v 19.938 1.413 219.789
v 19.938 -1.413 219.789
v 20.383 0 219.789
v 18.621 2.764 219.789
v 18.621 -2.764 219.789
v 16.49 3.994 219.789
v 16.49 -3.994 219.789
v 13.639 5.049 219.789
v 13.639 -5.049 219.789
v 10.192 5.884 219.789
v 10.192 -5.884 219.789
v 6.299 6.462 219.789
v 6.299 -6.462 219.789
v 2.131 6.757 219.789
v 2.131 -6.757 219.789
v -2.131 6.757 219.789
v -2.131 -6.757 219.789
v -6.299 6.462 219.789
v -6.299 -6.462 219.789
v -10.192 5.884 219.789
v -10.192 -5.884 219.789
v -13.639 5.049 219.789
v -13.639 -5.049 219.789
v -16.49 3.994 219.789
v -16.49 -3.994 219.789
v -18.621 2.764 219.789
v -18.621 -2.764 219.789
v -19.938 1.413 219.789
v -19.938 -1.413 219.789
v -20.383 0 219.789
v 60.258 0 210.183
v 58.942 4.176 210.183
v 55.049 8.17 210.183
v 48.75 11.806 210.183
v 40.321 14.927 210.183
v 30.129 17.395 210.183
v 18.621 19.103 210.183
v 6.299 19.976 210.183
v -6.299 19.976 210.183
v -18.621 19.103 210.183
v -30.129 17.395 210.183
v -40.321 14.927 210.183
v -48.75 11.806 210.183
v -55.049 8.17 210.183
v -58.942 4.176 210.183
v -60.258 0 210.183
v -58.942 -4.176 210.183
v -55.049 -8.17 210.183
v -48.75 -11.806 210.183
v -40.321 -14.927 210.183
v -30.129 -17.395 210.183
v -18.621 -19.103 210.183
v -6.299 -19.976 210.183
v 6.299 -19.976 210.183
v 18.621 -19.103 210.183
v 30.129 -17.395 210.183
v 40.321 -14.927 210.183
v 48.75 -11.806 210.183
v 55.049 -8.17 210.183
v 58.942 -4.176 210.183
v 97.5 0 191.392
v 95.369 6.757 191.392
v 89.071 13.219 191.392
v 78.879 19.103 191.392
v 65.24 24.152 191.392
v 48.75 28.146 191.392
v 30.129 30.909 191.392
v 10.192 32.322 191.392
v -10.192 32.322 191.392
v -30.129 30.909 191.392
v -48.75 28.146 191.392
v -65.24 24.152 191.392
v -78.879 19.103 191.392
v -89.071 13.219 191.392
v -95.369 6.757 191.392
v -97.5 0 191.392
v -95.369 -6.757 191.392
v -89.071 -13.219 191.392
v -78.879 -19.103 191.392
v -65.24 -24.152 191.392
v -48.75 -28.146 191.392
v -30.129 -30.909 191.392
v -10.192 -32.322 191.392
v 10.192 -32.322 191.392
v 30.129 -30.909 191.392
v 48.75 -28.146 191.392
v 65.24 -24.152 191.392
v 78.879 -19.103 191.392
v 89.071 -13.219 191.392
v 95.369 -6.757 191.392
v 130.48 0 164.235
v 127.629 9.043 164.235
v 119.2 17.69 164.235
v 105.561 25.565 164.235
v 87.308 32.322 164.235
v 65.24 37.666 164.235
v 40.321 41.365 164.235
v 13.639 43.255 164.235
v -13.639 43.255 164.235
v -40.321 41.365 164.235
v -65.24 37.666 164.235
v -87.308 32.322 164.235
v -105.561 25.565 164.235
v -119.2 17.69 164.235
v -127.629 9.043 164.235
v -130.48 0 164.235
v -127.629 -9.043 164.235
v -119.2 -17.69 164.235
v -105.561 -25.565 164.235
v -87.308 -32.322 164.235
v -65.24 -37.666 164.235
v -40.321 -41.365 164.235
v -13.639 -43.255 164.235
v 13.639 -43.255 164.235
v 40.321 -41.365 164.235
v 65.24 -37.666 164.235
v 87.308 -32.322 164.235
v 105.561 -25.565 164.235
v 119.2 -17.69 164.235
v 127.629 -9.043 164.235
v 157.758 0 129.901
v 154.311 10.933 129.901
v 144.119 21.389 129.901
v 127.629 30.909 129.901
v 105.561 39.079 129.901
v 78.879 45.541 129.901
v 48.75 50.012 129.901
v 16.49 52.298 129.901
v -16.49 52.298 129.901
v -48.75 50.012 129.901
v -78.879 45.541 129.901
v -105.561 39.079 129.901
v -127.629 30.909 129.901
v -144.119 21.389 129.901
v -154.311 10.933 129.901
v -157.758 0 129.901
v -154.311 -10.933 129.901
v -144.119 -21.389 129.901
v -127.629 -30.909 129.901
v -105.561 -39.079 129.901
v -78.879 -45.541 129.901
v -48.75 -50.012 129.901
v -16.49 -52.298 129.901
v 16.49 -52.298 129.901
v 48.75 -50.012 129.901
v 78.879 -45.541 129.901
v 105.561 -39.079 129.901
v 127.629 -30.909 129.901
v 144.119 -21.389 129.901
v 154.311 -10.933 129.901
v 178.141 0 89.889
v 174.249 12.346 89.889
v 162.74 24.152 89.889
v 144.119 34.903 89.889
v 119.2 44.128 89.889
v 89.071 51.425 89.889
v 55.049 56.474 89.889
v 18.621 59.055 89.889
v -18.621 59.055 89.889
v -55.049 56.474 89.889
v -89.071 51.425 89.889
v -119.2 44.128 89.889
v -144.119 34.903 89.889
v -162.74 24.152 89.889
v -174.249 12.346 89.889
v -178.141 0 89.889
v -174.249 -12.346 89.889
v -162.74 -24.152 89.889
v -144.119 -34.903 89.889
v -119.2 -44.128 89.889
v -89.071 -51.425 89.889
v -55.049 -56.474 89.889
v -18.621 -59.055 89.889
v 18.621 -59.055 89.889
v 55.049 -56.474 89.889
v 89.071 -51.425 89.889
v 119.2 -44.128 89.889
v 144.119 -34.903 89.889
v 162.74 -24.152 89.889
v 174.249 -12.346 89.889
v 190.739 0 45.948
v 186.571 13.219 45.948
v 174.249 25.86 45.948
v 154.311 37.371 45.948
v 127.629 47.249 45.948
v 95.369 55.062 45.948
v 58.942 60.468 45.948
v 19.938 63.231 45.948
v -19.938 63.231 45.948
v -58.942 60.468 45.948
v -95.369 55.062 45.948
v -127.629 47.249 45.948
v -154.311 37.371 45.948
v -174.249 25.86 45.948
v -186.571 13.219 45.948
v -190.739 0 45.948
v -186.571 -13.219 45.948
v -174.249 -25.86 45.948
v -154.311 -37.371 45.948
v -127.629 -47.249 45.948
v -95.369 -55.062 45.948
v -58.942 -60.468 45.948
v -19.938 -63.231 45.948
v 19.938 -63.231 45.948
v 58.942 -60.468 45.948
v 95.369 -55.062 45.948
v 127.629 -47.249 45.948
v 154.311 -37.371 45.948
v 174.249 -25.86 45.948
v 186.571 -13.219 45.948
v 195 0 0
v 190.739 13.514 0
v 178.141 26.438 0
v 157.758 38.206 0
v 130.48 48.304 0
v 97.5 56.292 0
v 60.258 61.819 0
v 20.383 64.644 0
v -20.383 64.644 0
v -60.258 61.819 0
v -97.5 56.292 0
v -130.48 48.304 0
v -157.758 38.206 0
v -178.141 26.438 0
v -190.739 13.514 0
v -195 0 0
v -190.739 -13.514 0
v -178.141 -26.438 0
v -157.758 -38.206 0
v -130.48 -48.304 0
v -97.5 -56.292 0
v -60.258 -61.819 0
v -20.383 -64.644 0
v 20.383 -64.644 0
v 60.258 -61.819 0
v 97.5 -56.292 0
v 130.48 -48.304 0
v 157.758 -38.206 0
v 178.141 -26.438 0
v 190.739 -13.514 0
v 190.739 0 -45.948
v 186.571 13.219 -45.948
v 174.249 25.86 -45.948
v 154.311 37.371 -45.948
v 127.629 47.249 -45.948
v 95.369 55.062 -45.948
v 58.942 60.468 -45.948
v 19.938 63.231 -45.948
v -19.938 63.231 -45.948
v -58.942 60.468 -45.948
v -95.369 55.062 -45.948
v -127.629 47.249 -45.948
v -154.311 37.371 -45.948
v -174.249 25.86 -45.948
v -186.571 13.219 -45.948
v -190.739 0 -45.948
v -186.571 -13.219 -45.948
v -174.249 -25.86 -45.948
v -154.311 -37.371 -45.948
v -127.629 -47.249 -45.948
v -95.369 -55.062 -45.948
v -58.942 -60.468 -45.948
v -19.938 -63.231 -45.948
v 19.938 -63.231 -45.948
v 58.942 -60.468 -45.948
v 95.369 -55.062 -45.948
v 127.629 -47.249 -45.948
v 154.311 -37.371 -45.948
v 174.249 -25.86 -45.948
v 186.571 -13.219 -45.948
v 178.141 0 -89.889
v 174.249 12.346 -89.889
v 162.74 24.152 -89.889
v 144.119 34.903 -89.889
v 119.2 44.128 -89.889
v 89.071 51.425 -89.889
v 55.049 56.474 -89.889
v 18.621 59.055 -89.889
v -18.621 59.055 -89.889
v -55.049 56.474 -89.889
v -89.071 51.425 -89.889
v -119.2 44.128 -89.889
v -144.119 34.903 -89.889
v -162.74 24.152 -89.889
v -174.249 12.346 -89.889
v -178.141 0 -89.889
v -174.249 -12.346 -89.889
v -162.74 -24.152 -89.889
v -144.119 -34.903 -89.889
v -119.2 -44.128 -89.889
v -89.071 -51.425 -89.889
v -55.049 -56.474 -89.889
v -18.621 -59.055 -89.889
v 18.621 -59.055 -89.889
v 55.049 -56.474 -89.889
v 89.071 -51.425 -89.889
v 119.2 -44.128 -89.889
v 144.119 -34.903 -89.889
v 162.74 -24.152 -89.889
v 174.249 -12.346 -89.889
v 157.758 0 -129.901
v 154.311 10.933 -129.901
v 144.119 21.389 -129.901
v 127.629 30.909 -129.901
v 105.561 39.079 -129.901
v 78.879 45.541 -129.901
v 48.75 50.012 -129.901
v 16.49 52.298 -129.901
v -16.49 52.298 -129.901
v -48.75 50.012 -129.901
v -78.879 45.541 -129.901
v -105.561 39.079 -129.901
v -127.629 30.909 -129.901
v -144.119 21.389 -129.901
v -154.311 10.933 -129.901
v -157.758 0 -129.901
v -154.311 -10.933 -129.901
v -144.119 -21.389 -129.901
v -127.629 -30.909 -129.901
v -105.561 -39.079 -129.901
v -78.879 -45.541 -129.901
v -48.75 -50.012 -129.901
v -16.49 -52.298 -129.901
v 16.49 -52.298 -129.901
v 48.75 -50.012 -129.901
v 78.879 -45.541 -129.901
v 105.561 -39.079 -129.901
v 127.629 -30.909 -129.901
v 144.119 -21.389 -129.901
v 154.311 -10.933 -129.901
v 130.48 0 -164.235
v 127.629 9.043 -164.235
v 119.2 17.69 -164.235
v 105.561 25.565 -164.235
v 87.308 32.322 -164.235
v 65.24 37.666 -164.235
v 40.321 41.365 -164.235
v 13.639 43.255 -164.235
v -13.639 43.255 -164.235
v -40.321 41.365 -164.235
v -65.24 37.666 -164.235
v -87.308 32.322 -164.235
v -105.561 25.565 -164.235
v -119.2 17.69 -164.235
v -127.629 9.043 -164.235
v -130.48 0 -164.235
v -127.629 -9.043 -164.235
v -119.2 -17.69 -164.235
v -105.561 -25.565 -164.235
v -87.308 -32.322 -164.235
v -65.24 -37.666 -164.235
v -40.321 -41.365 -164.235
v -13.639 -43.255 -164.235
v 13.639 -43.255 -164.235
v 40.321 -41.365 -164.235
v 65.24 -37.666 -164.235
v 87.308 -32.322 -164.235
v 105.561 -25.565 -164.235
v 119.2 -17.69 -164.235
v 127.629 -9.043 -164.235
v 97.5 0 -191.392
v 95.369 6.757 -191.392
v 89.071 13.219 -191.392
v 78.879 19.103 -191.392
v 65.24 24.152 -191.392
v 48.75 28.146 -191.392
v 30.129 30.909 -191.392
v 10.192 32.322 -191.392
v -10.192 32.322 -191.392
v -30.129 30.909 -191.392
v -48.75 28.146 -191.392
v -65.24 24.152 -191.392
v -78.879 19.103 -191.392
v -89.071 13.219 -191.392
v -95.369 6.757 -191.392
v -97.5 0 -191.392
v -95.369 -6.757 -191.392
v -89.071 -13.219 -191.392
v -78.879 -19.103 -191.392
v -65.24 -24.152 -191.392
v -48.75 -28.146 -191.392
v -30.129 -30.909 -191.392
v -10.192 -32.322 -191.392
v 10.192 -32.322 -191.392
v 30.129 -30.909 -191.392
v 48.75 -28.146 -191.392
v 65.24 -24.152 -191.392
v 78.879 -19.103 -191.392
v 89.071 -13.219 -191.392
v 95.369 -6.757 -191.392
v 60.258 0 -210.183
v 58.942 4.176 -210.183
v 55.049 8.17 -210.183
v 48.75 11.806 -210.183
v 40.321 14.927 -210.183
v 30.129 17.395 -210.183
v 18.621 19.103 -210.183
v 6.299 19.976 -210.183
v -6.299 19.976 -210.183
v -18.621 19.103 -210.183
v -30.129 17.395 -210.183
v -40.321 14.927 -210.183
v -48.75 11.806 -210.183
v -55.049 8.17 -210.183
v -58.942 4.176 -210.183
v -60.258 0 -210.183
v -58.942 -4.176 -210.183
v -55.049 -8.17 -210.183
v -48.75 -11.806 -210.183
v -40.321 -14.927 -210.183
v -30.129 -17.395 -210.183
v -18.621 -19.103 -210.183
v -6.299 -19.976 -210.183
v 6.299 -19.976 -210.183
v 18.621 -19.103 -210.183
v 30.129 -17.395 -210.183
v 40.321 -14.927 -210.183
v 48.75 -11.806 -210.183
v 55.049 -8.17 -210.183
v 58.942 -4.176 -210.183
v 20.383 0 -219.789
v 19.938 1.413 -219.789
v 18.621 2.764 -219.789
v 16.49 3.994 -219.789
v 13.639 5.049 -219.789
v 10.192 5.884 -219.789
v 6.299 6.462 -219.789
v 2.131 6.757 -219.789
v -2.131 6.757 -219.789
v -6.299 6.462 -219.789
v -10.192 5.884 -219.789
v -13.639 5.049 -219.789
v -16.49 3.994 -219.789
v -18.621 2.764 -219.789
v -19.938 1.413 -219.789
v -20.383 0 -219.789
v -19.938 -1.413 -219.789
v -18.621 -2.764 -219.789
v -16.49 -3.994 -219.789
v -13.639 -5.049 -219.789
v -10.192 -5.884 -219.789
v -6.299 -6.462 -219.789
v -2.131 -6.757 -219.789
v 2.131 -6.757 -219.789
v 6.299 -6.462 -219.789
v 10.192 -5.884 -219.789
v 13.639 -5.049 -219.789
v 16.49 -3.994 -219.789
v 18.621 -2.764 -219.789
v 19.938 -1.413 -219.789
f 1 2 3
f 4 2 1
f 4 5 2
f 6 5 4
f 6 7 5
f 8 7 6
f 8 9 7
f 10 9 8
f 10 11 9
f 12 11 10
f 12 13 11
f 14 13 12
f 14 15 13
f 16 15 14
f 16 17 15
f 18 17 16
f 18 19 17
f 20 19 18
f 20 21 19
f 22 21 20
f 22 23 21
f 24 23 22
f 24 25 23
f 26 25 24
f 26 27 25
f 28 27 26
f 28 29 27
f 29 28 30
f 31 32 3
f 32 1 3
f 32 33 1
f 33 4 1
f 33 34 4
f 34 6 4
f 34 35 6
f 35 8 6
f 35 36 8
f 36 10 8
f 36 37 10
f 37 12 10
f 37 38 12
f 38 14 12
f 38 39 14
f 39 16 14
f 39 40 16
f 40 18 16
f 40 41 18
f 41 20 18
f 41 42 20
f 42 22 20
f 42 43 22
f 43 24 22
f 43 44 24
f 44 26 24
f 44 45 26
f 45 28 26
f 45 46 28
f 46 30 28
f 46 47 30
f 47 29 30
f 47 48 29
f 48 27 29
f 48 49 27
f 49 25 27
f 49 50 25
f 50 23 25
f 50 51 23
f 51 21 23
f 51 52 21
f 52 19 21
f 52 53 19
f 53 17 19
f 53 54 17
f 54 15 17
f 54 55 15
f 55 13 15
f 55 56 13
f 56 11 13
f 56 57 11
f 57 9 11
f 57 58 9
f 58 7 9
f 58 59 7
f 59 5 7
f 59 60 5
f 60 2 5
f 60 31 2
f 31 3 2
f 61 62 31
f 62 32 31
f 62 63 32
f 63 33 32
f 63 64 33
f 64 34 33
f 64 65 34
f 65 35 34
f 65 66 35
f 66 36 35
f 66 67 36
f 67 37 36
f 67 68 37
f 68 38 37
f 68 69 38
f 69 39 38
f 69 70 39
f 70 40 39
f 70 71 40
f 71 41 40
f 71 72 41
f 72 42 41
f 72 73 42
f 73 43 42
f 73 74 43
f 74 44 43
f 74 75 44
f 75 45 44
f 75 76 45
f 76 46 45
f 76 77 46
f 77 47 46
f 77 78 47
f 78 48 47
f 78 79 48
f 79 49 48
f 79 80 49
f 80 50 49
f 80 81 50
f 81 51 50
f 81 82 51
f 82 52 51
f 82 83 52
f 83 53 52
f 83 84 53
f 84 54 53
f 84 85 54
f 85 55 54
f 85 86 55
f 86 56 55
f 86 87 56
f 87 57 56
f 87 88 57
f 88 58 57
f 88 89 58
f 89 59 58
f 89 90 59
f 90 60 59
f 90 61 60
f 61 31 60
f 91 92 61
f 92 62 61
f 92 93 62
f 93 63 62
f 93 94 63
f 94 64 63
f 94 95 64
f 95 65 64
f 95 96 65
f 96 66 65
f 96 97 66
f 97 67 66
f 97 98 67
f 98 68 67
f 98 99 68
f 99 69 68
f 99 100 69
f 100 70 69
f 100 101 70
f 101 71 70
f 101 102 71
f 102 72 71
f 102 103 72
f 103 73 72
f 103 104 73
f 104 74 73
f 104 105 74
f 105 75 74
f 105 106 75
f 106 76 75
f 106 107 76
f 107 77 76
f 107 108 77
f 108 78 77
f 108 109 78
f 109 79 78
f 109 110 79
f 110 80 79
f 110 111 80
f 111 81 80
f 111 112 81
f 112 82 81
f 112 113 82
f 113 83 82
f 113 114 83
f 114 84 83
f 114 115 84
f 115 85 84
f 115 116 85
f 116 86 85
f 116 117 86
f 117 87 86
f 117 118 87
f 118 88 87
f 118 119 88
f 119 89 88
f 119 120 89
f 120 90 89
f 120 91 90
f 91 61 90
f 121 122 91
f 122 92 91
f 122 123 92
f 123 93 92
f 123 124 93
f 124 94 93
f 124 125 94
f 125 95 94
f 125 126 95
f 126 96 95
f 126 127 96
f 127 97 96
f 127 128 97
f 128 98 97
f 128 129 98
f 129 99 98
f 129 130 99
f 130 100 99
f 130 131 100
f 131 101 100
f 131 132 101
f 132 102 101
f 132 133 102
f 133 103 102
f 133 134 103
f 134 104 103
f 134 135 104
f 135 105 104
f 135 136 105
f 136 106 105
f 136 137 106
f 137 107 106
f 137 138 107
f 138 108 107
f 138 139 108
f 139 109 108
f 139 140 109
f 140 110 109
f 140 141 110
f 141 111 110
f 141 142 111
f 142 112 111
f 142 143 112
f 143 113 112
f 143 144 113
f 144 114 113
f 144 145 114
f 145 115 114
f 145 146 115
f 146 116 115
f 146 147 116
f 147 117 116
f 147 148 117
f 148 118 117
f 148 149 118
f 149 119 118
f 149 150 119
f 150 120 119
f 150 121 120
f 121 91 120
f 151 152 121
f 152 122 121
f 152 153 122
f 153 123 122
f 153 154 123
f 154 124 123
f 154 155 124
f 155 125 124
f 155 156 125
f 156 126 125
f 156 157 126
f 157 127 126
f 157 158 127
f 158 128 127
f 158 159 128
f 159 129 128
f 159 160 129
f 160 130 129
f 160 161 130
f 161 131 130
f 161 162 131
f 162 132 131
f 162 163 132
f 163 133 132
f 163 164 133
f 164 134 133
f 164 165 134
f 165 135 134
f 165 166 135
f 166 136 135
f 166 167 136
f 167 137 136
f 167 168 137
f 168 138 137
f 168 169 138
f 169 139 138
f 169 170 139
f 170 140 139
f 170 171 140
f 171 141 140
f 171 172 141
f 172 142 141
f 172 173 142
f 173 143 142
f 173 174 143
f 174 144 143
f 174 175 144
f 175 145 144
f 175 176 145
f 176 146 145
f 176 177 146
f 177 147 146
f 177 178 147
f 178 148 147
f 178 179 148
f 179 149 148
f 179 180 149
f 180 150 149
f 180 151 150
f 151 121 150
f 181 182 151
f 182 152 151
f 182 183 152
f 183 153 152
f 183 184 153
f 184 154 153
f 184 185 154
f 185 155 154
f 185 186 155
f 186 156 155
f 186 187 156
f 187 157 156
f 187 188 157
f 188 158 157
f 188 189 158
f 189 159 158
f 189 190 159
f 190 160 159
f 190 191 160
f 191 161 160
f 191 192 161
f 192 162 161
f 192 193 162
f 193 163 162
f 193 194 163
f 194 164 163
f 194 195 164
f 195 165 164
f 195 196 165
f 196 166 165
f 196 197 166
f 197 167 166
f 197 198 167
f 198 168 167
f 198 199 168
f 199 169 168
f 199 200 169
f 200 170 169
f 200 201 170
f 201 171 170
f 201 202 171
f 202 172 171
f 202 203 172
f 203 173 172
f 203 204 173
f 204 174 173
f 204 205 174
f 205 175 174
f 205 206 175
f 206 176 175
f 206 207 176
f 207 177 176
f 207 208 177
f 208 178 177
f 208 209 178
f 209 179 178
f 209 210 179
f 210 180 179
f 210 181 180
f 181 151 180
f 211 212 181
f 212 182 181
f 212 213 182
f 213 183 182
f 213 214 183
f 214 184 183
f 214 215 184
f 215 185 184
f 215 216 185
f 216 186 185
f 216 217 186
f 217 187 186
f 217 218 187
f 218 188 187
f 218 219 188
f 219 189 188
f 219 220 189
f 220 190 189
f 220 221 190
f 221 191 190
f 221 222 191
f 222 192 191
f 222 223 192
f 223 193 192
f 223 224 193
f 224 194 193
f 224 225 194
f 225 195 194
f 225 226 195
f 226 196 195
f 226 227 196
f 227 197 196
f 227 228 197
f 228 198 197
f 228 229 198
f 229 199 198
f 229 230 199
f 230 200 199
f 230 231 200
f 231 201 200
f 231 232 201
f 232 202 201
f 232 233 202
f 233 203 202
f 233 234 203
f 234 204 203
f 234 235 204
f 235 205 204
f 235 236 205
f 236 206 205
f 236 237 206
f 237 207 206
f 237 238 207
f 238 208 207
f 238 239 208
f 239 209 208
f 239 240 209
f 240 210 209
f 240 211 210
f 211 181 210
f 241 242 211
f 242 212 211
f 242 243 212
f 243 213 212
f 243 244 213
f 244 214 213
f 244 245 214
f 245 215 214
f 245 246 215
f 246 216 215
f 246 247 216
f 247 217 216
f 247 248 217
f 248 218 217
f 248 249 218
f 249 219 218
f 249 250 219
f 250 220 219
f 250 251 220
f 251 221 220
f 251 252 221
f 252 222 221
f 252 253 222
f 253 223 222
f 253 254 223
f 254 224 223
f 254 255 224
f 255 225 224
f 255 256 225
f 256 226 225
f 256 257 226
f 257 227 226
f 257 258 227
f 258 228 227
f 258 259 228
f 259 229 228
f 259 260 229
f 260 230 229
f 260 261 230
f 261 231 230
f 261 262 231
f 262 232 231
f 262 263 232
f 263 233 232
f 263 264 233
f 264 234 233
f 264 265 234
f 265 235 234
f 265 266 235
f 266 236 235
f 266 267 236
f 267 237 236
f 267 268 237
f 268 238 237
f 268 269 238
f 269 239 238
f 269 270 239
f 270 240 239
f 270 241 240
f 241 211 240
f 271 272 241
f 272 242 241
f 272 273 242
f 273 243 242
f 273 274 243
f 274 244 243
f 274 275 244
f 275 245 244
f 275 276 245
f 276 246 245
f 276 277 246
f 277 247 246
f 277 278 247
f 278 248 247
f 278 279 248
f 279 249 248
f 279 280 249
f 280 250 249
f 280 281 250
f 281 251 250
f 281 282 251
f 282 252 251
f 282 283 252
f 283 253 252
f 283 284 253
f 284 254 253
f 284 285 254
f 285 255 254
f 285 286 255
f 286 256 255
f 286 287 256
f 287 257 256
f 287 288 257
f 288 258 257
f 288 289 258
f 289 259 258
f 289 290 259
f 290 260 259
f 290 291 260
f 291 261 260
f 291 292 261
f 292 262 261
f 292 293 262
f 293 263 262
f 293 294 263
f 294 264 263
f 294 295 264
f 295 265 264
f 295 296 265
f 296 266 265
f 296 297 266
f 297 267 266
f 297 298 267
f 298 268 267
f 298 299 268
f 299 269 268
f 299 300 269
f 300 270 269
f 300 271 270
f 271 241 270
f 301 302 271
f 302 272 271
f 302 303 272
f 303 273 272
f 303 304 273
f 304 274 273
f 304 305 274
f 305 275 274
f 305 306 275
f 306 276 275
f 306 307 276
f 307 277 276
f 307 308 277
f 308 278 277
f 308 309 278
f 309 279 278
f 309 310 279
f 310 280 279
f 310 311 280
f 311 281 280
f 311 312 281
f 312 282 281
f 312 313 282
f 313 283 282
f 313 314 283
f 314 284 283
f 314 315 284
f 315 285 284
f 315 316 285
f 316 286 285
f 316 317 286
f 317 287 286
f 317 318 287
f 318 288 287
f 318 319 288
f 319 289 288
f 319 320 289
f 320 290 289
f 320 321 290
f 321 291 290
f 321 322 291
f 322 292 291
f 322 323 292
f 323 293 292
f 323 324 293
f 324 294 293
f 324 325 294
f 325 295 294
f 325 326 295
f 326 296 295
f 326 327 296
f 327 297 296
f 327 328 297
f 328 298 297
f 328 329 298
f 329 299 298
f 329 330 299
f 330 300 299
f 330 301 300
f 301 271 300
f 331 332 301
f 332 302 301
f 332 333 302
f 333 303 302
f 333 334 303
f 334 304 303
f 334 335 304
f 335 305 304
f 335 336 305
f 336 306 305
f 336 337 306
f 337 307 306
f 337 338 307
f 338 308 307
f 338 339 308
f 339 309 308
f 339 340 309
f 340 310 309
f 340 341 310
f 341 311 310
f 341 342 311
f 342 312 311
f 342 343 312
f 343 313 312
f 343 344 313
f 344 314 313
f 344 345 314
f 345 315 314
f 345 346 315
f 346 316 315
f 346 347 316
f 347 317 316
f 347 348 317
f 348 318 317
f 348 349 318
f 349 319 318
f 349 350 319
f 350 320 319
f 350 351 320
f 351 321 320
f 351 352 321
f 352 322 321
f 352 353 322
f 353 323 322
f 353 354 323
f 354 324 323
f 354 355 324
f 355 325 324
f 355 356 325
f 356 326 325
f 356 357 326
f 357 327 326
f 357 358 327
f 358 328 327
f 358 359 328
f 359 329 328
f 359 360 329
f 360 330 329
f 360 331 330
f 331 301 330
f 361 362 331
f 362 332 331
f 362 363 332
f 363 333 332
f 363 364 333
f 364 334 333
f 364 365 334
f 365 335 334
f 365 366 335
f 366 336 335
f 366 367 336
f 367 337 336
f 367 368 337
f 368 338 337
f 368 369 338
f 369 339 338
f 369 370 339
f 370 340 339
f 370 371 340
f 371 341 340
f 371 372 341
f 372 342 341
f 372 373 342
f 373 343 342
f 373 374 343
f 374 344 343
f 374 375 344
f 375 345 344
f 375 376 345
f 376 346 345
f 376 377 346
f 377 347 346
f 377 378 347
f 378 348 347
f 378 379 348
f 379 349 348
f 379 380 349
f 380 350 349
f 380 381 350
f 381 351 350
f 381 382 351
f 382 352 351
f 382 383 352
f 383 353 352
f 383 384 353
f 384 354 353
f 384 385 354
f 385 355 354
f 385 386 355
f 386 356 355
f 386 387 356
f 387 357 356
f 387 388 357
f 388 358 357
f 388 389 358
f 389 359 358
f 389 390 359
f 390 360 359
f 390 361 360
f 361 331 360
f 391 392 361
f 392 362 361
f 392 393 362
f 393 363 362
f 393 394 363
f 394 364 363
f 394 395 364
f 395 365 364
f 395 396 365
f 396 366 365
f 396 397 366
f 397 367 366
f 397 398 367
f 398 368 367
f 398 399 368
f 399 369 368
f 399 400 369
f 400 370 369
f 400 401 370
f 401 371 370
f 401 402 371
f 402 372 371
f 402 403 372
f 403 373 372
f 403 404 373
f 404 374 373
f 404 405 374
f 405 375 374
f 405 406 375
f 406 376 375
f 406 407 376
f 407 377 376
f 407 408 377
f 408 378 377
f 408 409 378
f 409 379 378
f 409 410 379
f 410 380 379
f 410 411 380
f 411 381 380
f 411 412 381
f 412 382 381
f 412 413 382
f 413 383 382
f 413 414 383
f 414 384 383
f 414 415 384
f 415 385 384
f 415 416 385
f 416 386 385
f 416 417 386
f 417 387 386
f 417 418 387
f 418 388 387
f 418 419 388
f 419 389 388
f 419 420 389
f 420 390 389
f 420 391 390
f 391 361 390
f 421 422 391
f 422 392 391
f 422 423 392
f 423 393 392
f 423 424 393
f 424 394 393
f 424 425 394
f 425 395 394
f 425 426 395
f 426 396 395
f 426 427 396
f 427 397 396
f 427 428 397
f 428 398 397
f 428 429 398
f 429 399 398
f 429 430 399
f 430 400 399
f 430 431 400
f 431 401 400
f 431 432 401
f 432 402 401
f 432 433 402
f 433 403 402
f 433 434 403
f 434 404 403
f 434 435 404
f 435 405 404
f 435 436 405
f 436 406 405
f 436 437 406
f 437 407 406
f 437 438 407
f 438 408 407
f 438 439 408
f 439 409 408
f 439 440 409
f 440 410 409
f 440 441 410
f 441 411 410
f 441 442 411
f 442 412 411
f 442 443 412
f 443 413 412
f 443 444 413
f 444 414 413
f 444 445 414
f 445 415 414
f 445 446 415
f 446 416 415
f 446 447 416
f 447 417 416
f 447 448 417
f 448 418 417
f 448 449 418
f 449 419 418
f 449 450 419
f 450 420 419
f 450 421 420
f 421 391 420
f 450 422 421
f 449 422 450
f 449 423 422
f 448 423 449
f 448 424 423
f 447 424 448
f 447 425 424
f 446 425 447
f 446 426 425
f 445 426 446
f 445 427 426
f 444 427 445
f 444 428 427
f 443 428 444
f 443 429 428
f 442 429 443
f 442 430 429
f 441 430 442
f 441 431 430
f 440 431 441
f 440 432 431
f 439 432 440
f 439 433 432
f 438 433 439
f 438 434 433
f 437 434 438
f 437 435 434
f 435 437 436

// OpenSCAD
// Generated by SolidPython 1.0.1 on 2020-07-29 00:46:51


scale(v = [15, 5, 17]) {
	sphere(r = 13);
}
/***********************************************
*********      SolidPython code:      **********
************************************************
 
# import packages: SolidPython
from solid import *
from solid.utils import *
from itertools import chain, combinations, permutations


class Resize:

    def __init__(self, scad_file):
        self.scad_file = scad_file
        #self.scad_file = import_scad(scad_file)
        # cone/cylinder param:
        self.r1 = 0
        self.r2 = 0
        self.h = 0
        # rectangular prism param:
        self.w = 0
        self.l = 0
        # ellipse param:
        self.r = 0

    # import OpenScad code (file name corresponds to shape)


    # classify shape + parameters
    def assign(self, param1, param2, param3):
        if self.scad_file == 'cone.scad':
            self.r1 = param1
            self.r2 = param2
            self.h = param3
        elif self.scad_file == 'cylinder.scad':
            self.r1 = param1
            self.r2 = param2
            self.h = param3
        elif self.scad_file == 'rectangularPrism.scad':
            self.h = param1
            self.l = param2
            self.w = param3
        else:
            self.r = param1
            self.h = param2

    # resize parameters
    def iterate(self):
        x = range(3, 20, 2)
        i = 1
        if self.scad_file == 'cone.scad':
            tempList = list(permutations(x, 2))
            for temp in tempList:
                param1 = temp[0]
                param2 = temp[1]
                filepath = 'produced_scad_files/' + 'cone' + str(param1) + '_' + str(param2) + '_' + '.scad'
                scad_render_to_file(cylinder(h=param1, r1=param2, r2=0), filepath)

        elif self.scad_file == 'cylinder.scad':
            tempList = list(permutations(x, 3))
            for temp in tempList:
                param1 = temp[0]
                param2 = temp[1]
                filepath = 'produced_scad_files/' + 'cylinder' + str(param1) + '_' + str(param2) + '_' + '.scad'
                scad_render_to_file(cylinder(h=param1, r1=param2, r2=param2), filepath)

        elif self.scad_file == 'rectangularPrism.scad':
            tempList = list(permutations(x, 3))
            for temp in tempList:
                param1 = temp[0]
                param2 = temp[1]
                param3 = temp[2]
                filepath = 'produced_scad_files/' + 'rectangularPrism' + str(param1) + '_' + str(param2) + '_' + str(
                    param3) + '.scad'
                scad_render_to_file(cube(size=(param1, param2, param3)), filepath)

        elif self.scad_file == 'ellipse.scad':
            tempList = list(permutations(x, 4))
            for temp in tempList:
                param1 = temp[0]
                param2 = temp[1]
                param3 = temp[2]
                param4 = temp[3]
                filepath = 'produced_scad_files/' + 'ellipse' + str(param1) + '_' + str(param2) + '_' + str(param3) + '_' + str(param4) + '.scad'
                scad_render_to_file(scale([param1, param2, param3])(sphere(r=param4)), filepath)

    def render_to_scadfile(self):
        scad_render_to_file(scad, 'example.scad') 
 
************************************************/
